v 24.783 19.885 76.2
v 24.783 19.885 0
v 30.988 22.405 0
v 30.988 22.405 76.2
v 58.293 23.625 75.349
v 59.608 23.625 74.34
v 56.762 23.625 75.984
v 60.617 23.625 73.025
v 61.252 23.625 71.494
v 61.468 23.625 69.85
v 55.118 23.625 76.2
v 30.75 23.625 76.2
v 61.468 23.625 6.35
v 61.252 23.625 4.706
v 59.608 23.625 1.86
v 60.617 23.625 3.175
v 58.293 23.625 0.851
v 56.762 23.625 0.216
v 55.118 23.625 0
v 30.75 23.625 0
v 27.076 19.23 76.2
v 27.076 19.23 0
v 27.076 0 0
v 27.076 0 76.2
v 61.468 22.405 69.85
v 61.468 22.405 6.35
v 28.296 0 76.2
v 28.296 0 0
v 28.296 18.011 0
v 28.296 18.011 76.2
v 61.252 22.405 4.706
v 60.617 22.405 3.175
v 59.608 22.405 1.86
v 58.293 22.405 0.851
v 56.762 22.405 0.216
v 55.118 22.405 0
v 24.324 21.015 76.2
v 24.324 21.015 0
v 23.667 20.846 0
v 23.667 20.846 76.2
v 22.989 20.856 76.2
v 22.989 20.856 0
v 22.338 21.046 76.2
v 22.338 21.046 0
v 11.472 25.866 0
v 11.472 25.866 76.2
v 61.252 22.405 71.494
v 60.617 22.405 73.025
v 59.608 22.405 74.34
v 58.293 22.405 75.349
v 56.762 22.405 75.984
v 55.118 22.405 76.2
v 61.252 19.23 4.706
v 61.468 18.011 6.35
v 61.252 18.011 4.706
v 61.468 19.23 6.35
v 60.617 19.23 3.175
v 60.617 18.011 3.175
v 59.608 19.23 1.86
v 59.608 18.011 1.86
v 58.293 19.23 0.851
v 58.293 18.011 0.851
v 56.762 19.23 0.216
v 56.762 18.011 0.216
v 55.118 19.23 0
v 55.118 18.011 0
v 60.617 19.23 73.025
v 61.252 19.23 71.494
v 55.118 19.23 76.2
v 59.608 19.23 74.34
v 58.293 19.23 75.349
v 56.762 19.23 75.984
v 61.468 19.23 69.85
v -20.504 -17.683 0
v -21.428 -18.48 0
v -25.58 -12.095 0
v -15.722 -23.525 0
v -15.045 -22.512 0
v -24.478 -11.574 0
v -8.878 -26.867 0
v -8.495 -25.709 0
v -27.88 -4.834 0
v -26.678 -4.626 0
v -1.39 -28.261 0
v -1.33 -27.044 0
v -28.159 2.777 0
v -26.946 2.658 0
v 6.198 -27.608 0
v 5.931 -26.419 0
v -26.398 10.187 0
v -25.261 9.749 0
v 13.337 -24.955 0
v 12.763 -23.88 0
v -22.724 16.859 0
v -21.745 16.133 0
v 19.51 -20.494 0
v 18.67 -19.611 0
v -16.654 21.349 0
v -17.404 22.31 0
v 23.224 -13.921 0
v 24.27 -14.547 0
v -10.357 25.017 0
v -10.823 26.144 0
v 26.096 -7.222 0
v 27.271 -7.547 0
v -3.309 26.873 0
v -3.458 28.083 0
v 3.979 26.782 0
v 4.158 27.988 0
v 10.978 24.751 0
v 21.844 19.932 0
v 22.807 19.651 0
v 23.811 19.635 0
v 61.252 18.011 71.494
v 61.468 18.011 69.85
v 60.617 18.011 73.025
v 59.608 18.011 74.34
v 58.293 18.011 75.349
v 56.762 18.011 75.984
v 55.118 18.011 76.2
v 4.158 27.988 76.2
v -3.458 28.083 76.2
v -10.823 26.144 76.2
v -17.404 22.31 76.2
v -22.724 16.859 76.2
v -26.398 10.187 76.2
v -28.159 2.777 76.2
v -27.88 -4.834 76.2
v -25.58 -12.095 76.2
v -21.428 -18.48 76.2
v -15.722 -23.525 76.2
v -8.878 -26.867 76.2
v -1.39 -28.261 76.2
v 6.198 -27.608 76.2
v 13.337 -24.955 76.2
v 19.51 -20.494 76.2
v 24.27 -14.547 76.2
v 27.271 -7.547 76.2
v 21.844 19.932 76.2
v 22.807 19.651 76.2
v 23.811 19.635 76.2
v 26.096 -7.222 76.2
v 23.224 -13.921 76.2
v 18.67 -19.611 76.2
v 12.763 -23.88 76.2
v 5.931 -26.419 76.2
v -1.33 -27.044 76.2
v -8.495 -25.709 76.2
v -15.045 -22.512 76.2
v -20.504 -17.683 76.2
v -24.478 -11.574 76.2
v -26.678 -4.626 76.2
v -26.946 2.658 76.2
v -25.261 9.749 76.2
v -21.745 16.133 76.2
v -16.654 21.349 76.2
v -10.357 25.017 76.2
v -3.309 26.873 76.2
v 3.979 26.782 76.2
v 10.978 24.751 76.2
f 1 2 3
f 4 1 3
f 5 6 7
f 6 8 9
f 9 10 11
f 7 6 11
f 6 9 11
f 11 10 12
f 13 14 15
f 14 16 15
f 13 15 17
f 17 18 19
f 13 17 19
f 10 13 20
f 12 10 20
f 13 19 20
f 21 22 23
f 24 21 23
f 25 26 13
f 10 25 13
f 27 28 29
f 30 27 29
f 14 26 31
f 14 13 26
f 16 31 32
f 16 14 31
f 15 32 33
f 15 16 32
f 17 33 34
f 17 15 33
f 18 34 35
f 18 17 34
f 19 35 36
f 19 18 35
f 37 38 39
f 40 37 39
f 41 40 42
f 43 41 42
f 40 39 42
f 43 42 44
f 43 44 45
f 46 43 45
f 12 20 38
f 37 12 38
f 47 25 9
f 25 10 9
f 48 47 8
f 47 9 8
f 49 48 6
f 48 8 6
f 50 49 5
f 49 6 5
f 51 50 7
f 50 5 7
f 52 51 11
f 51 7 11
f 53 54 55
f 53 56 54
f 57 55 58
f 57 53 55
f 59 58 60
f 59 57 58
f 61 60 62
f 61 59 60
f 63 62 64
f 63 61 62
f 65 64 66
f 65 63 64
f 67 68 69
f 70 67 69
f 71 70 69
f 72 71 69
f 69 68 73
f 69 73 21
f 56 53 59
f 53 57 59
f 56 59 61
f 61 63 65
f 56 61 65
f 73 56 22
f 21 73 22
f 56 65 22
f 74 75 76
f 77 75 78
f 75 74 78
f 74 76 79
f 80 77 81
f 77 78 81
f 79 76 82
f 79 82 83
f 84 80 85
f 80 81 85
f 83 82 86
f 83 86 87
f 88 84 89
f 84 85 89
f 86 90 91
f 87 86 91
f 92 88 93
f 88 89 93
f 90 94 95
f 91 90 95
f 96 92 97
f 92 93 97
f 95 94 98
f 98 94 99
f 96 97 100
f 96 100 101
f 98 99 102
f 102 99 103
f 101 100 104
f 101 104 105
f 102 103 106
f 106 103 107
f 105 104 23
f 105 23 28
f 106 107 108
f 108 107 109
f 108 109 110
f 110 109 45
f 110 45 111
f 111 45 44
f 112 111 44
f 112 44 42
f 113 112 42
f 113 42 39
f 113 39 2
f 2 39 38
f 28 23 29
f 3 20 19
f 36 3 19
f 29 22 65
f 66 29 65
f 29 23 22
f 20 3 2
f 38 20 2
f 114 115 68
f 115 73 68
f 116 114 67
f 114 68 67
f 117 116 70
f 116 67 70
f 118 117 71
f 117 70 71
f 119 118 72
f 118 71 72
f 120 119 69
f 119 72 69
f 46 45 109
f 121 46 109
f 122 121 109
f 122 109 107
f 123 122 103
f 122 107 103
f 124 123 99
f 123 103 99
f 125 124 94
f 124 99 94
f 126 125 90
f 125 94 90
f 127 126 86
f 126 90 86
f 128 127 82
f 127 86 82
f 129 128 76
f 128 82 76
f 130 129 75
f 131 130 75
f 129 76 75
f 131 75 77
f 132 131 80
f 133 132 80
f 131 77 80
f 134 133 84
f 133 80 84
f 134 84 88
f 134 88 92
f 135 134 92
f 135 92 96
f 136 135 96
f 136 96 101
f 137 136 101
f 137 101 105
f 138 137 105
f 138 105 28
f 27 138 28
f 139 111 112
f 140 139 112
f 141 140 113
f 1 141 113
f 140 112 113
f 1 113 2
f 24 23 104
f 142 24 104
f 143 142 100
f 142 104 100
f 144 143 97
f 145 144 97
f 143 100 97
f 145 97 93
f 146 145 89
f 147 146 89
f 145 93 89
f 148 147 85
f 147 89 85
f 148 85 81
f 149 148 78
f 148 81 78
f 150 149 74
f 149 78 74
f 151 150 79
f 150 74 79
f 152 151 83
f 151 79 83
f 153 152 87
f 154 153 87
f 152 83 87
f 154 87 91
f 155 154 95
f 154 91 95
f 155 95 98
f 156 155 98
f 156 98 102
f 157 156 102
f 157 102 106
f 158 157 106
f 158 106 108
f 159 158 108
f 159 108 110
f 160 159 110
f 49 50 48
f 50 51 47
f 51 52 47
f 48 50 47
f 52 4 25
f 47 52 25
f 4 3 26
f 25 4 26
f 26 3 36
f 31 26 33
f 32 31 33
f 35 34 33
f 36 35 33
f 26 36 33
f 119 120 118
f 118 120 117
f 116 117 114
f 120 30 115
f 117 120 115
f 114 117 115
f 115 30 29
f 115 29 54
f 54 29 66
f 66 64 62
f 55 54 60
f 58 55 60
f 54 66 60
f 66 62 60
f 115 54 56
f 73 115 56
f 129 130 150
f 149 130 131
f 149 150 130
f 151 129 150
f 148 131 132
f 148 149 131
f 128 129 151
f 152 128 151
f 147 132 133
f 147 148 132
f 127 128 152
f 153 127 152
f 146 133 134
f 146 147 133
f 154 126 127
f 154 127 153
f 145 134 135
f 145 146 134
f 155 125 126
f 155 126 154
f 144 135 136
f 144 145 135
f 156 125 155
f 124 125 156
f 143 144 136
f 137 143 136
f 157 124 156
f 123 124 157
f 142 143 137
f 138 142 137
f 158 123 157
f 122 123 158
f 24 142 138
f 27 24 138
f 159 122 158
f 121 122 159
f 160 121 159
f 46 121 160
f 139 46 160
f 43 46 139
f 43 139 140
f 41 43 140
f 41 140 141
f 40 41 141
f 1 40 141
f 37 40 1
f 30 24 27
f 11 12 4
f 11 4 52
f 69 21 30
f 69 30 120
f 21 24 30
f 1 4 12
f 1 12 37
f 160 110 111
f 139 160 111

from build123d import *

# Parameters (mm, degrees)
BOSS_EXTRUDE1_DEPTH = 76.2
FILLET2_R           = 6.35


with BuildPart() as part:
    # Sketch2 → Boss-Extrude1 (new body)
    with BuildSketch(Plane.XY):
        with BuildLine():
            Line((61.468, 23.62454), (30.749865701, 23.62454))
            Line((30.749865701, 23.62454), (24.323763897, 21.014679926))
            ThreePointArc((24.323763897, 21.014679926), (23.327763264, 20.82831872), (22.338166155, 21.046138193))
            Line((22.338166155, 21.046138193), (11.472349033, 25.865540532))
            ThreePointArc((11.472349033, 25.865540532), (-23.719801629, -15.427637215), (28.2956, 0))
            Line((28.2956, 0), (28.2956, 18.01114))
            Line((28.2956, 18.01114), (61.468, 18.01114))
            Line((61.468, 18.01114), (61.468, 19.23034))
            Line((61.468, 19.23034), (27.0764, 19.23034))
            Line((27.0764, 19.23034), (27.0764, 0))
            ThreePointArc((27.0764, 0), (-22.697763498, -14.762891626), (10.978028787, 24.751046865))
            Line((10.978028787, 24.751046865), (21.843845909, 19.931644525))
            ThreePointArc((21.843845909, 19.931644525), (23.308449631, 19.609271705), (24.782530568, 19.88508629))
            Line((24.782530568, 19.88508629), (30.988, 22.40534))
            Line((30.988, 22.40534), (61.468, 22.40534))
            Line((61.468, 22.40534), (61.468, 23.62454))
        make_face()
    extrude(amount=BOSS_EXTRUDE1_DEPTH)

    # Fillet2
    fillet2_edges = [part.edges().sort_by_distance(p)[0] for p in [
        (61.468, 23.01494, 76.2),
        (61.468, 18.62074, 0),
        (61.468, 23.01494, 0),
        (61.468, 18.62074, 76.2),
    ]]
    fillet(fillet2_edges, radius=FILLET2_R)


solid = part.part
